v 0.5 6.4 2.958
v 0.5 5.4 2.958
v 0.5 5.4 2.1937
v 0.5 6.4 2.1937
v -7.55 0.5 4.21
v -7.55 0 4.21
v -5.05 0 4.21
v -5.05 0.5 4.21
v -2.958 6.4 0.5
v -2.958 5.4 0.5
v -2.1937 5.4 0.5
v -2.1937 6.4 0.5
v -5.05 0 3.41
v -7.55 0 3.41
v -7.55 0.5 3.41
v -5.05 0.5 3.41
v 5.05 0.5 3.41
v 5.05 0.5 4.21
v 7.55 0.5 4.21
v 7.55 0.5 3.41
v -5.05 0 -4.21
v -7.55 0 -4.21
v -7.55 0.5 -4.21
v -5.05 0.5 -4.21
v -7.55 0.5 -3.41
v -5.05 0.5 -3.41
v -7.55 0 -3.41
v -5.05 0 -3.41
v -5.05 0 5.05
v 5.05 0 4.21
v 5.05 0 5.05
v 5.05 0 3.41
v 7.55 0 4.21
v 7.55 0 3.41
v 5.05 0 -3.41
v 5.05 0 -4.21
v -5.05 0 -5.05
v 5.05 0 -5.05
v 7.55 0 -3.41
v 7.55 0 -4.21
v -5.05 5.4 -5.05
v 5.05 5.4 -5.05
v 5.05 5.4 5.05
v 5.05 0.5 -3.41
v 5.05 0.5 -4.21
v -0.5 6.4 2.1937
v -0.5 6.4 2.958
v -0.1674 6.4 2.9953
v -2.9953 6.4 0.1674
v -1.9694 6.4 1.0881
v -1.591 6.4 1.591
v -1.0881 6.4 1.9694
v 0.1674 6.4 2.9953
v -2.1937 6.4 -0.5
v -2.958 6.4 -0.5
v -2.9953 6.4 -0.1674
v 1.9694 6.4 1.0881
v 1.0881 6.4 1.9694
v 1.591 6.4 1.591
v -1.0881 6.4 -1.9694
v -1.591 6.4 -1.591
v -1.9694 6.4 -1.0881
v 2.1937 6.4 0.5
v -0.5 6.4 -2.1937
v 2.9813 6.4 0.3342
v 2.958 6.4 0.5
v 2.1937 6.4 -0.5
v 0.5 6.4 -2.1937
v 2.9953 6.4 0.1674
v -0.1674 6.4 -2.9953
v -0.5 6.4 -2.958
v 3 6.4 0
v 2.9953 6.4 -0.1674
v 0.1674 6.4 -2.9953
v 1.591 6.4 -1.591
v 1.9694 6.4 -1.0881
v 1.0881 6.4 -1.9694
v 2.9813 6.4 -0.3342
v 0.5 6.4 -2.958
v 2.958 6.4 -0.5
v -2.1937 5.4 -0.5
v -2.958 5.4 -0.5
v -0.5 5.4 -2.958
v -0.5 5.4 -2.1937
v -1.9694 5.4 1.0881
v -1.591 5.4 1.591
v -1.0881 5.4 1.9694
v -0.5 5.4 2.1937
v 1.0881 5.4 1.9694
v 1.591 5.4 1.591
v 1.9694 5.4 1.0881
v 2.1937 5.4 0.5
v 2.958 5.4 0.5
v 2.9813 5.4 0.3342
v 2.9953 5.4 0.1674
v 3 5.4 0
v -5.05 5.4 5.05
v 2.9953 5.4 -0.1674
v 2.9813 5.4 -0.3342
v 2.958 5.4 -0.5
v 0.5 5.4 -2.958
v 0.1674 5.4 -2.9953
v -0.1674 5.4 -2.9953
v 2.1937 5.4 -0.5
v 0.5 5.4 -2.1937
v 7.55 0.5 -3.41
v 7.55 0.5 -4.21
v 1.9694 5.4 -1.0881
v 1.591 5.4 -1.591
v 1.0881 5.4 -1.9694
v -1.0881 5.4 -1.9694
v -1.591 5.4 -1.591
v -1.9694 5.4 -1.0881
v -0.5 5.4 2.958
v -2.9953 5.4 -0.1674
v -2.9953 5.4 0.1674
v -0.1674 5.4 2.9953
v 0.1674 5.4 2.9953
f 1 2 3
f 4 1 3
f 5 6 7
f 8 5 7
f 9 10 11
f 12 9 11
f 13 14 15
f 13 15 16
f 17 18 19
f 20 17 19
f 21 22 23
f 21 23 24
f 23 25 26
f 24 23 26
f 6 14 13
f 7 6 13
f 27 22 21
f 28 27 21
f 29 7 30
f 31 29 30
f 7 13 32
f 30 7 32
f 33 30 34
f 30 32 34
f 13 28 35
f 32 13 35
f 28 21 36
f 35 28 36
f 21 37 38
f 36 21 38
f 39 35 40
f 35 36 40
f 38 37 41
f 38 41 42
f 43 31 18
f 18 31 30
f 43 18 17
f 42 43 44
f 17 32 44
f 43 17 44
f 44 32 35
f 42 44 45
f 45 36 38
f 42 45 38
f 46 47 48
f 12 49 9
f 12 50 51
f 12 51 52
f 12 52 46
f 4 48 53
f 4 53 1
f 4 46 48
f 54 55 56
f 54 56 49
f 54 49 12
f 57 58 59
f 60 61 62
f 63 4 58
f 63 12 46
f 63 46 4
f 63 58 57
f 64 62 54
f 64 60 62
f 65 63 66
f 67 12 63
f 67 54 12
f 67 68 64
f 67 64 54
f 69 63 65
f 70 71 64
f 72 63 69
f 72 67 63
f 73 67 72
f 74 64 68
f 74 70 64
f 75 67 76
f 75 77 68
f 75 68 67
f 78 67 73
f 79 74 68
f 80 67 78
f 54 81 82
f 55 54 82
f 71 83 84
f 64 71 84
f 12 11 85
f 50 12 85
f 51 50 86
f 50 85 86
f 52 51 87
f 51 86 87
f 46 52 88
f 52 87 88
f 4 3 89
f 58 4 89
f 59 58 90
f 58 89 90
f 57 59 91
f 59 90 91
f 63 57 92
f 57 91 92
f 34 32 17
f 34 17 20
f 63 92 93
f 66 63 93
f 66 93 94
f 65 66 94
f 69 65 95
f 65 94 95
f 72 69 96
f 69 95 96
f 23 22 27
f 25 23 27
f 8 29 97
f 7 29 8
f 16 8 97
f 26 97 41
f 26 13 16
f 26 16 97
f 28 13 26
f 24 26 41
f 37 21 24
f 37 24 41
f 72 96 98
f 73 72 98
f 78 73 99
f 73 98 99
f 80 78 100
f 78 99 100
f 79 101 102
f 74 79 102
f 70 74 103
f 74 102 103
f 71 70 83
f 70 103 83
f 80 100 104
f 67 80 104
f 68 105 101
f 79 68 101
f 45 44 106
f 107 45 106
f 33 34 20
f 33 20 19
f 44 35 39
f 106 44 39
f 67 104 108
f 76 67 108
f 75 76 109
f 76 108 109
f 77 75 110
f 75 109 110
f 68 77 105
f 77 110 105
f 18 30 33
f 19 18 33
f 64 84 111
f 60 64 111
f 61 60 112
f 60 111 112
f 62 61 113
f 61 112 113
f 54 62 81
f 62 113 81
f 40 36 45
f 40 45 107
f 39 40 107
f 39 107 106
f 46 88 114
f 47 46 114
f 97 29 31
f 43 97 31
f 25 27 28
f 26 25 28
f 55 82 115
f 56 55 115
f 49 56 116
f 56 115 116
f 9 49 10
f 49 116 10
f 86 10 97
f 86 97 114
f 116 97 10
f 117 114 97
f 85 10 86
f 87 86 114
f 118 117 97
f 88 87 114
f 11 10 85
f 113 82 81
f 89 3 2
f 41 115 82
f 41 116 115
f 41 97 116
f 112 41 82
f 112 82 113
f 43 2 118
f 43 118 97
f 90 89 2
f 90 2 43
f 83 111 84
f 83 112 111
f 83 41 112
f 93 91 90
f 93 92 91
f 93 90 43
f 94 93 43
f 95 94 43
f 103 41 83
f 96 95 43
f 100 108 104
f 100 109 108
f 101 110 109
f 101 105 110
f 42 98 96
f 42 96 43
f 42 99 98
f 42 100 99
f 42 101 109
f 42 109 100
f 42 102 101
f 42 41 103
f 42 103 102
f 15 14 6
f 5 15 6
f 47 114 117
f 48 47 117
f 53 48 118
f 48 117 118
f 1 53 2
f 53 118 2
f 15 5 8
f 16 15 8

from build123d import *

# Parameters (mm, degrees)
SKETCH1_W           = 10.1
SKETCH1_H           = 10.1
BOSS_EXTRUDE1_DEPTH = 5.4
SKETCH2_W           = 1
SKETCH2_H           = 1
BOSS_EXTRUDE2_DEPTH = 1
SKETCH3_W           = 2.5
SKETCH3_H           = 0.8
BOSS_EXTRUDE3_DEPTH = 0.5


with BuildPart() as part:
    # Sketch1 → Boss-Extrude1 (new body)
    with BuildSketch(Plane(origin=(0, 0, 0), x_dir=(1, 0, 0), z_dir=(0, 1, 0))):
        Rectangle(SKETCH1_W, SKETCH1_H)
    extrude(amount=BOSS_EXTRUDE1_DEPTH)

    # Sketch2 → Boss-Extrude2 (add)
    with BuildSketch(Plane(origin=(0, 5.4, 0), x_dir=(1, 0, 0), z_dir=(0, 1, 0))):
        with BuildLine():
            ThreePointArc((0.5, 2.958039892), (0, 3), (-0.5, 2.958039892))
            Line((-0.5, 2.958039892), (-0.5, 2.193741097))
            ThreePointArc((-0.5, 2.193741097), (0, 2.25), (0.5, 2.193741097))
            Line((0.5, 2.193741097), (0.5, 2.958039892))
        make_face()
        with BuildLine():
            Line((-0.5, -2.193741097), (-0.5, -2.958039892))
            ThreePointArc((-0.5, -2.958039892), (0, -3), (0.5, -2.958039892))
            Line((0.5, -2.958039892), (0.5, -2.193741097))
            ThreePointArc((0.5, -2.193741097), (0, -2.25), (-0.5, -2.193741097))
        make_face()
        with BuildLine():
            ThreePointArc((0.5, 2.193741097), (0, 2.25), (-0.5, 2.193741097))
            Line((-0.5, 2.193741097), (-0.5, 0.5))
            Line((-0.5, 0.5), (0.5, 0.5))
            Line((0.5, 0.5), (0.5, 2.193741097))
        make_face()
        with BuildLine():
            Line((-0.5, 0.5), (-0.5, 2.193741097))
            ThreePointArc((-0.5, 2.193741097), (-1.590990258, 1.590990258), (-2.193741097, 0.5))
            Line((-2.193741097, 0.5), (-0.5, 0.5))
        make_face()
        with BuildLine():
            Line((-0.5, -0.5), (-0.5, 0.5))
            Line((-0.5, 0.5), (-2.193741097, 0.5))
            ThreePointArc((-2.193741097, 0.5), (-2.25, 0), (-2.193741097, -0.5))
            Line((-2.193741097, -0.5), (-0.5, -0.5))
        make_face()
        with BuildLine():
            Line((-2.193741097, 0.5), (-2.958039892, 0.5))
            ThreePointArc((-2.958039892, 0.5), (-3, 0), (-2.958039892, -0.5))
            Line((-2.958039892, -0.5), (-2.193741097, -0.5))
            ThreePointArc((-2.193741097, -0.5), (-2.25, 0), (-2.193741097, 0.5))
        make_face()
        with BuildLine():
            ThreePointArc((3, 0), (2.989491568, 0.250878781), (2.958039892, 0.5))
            Line((2.958039892, 0.5), (2.193741097, 0.5))
            ThreePointArc((2.193741097, 0.5), (2.235891038, 0.251577555), (2.25, 0))
            ThreePointArc((2.25, 0), (2.235891038, -0.251577555), (2.193741097, -0.5))
            Line((2.193741097, -0.5), (2.958039892, -0.5))
            ThreePointArc((2.958039892, -0.5), (2.989491568, -0.250878781), (3, 0))
        make_face()
        with BuildLine():
            Line((0.5, -0.5), (-0.5, -0.5))
            Line((-0.5, -0.5), (-0.5, -2.193741097))
            ThreePointArc((-0.5, -2.193741097), (0, -2.25), (0.5, -2.193741097))
            Line((0.5, -2.193741097), (0.5, -0.5))
        make_face()
        Rectangle(SKETCH2_W, SKETCH2_H)
        with BuildLine():
            Line((2.193741097, 0.5), (0.5, 0.5))
            Line((0.5, 0.5), (0.5, -0.5))
            Line((0.5, -0.5), (2.193741097, -0.5))
            ThreePointArc((2.193741097, -0.5), (2.235891038, -0.251577555), (2.25, 0))
            ThreePointArc((2.25, 0), (2.235891038, 0.251577555), (2.193741097, 0.5))
        make_face()
        with BuildLine():
            ThreePointArc((2.193741097, 0.5), (1.590990258, 1.590990258), (0.5, 2.193741097))
            Line((0.5, 2.193741097), (0.5, 0.5))
            Line((0.5, 0.5), (2.193741097, 0.5))
        make_face()
        with BuildLine():
            Line((2.193741097, -0.5), (0.5, -0.5))
            Line((0.5, -0.5), (0.5, -2.193741097))
            ThreePointArc((0.5, -2.193741097), (1.590990258, -1.590990258), (2.193741097, -0.5))
        make_face()
        with BuildLine():
            Line((-0.5, -2.193741097), (-0.5, -0.5))
            Line((-0.5, -0.5), (-2.193741097, -0.5))
            ThreePointArc((-2.193741097, -0.5), (-1.590990258, -1.590990258), (-0.5, -2.193741097))
        make_face()
    extrude(amount=BOSS_EXTRUDE2_DEPTH)

    # Sketch3 → Boss-Extrude3 (add)
    with BuildSketch(Plane.XZ):
        with Locations((-6.3, 3.81)):
            Rectangle(SKETCH3_W, SKETCH3_H)
        with Locations((6.3, 3.81)):
            Rectangle(SKETCH3_W, SKETCH3_H)
        with Locations((6.3, -3.81)):
            Rectangle(SKETCH3_W, SKETCH3_H)
        with Locations((-6.3, -3.81)):
            Rectangle(SKETCH3_W, SKETCH3_H)
    extrude(amount=-BOSS_EXTRUDE3_DEPTH)


solid = part.part
